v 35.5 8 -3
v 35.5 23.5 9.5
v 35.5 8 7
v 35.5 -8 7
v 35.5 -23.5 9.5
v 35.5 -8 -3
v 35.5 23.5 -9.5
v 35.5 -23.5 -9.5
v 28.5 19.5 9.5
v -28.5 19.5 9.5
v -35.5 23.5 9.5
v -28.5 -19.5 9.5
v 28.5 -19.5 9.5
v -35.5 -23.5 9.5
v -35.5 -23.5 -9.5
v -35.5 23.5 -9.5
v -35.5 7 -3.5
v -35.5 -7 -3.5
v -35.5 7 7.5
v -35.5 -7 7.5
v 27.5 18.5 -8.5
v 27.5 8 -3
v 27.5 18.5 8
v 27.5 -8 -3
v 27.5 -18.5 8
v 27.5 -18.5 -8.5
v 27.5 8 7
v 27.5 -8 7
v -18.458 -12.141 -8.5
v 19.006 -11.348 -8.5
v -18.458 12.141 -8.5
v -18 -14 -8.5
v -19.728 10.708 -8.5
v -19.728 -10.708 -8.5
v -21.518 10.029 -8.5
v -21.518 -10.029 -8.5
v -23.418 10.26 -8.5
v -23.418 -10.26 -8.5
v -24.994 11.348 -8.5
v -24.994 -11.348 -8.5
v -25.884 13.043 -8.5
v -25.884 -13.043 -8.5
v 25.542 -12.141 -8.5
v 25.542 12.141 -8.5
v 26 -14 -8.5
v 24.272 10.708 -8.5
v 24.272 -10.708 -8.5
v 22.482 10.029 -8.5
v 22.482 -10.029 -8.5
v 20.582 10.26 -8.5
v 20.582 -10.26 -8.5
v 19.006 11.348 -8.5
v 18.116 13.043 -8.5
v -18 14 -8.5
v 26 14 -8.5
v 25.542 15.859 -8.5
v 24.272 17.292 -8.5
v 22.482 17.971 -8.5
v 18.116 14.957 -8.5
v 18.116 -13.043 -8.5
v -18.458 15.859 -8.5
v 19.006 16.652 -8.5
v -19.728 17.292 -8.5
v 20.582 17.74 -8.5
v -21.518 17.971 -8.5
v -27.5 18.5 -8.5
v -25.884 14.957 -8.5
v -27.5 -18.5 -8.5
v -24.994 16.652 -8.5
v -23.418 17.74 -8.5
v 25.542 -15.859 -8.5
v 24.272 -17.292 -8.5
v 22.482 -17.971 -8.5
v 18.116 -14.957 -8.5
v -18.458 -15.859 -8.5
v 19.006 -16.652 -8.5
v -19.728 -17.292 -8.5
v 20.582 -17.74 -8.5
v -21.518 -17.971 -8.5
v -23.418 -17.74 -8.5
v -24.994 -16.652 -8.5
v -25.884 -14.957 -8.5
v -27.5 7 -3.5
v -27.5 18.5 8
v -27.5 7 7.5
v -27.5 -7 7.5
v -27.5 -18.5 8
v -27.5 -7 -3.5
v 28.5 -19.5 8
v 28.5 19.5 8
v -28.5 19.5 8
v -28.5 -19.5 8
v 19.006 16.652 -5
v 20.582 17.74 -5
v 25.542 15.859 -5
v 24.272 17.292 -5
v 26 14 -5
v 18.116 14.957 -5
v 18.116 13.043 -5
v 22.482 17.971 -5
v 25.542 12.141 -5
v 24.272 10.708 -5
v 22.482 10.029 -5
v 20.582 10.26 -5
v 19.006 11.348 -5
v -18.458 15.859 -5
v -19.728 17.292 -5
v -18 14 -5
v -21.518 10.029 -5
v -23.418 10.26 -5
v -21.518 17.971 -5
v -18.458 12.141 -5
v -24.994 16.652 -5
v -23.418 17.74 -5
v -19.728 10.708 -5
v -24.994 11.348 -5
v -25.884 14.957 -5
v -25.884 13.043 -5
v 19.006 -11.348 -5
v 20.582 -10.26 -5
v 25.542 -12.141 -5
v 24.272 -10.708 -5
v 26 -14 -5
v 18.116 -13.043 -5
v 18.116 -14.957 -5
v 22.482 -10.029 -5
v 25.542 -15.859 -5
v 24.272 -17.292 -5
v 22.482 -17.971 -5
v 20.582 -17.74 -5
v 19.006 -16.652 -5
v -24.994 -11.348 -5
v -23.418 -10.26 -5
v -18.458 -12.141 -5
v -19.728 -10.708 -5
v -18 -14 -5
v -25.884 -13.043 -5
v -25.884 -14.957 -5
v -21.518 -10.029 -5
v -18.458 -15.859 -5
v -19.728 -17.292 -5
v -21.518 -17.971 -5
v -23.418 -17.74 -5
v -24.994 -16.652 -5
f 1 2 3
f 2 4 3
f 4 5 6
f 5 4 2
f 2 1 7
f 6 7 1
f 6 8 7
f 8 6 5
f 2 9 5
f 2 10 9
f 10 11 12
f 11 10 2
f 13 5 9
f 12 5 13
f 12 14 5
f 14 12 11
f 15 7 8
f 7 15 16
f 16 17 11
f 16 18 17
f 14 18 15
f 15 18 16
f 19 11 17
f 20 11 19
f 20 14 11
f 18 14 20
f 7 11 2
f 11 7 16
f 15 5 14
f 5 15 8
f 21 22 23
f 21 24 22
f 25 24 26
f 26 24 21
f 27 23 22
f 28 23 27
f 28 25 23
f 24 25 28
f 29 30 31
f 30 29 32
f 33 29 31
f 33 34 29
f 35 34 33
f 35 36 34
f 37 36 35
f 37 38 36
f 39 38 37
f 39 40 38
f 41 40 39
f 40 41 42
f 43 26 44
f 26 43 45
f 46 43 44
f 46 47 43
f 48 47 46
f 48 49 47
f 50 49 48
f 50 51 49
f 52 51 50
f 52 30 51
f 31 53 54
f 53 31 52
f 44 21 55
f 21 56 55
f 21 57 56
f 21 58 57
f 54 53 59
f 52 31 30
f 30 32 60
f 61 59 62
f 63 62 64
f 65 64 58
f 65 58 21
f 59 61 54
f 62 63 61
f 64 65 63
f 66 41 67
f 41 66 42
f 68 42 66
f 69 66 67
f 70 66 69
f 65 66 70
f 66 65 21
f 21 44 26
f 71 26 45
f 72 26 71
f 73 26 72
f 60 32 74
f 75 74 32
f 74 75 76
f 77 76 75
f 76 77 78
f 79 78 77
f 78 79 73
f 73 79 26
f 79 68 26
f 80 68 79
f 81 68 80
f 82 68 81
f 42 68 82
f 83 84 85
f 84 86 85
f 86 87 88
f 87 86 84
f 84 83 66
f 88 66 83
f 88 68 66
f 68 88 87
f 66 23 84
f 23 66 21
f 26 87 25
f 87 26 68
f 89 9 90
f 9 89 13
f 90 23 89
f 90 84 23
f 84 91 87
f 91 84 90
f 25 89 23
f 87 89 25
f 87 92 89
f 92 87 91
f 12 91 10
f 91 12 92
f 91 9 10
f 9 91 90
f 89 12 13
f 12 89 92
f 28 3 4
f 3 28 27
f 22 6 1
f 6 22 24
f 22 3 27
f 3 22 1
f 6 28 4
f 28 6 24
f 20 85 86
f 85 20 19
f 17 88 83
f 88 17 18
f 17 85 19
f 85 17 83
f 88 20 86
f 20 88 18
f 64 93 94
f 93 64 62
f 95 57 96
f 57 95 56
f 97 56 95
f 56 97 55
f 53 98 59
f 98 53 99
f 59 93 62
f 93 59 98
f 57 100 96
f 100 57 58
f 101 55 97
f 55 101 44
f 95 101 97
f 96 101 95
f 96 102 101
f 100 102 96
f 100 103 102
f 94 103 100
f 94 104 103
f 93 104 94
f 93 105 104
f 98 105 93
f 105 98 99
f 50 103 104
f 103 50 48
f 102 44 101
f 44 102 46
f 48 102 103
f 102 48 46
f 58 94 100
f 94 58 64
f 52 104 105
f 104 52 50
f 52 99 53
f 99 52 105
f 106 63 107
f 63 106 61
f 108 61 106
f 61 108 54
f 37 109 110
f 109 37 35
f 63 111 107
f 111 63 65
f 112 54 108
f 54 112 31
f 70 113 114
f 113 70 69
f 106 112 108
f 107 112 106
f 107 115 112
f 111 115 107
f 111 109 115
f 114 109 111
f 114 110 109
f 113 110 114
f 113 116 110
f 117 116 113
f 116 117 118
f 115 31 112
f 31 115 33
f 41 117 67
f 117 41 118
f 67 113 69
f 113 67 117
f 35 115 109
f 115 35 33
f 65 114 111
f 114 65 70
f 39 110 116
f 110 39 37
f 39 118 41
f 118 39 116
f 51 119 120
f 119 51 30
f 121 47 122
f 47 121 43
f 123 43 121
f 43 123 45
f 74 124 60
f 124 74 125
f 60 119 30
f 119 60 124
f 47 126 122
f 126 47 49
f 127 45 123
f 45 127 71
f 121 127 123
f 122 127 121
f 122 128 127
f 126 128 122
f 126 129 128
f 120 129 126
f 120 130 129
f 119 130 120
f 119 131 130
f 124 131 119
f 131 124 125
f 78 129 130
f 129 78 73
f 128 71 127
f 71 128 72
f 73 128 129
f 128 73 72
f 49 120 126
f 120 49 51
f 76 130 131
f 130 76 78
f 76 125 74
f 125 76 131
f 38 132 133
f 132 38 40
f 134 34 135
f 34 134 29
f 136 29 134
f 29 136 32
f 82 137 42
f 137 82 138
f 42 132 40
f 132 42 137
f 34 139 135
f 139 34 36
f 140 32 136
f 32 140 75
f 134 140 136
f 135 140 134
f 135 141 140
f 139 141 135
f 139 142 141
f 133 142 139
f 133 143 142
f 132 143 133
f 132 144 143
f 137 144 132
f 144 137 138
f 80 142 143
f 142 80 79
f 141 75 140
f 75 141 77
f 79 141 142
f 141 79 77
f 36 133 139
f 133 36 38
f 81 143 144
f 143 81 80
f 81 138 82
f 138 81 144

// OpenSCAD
// Dimensions for parent
totalWidth = 71;
totalLength = 47;
totalHeight = 19;

// Dimensions for inner cube
innerWidth = 55;
innerLength = 37;
innerHeight = 19;

// Dimensions for ledge
ledgeWidth = 57;
ledgeLength = 39;
ledgeHeight = 2;

// Dimensions for cycliner
cylinderHeight = 4;
cylinderDiameter = 4;

// Dimensions for Arduino USB hole
arduinoHoleWidth = 10;
arduinoHoleLength = 16;
arduinoHoleHeight = 10;

// Dimensions for Computer UBS hole
computerHoleWidth = 10;
computerHoleLength = 14;
computerHoleHeight = 11;

difference() {
    intersection() {
        difference() {
            cube([totalWidth, totalLength, totalHeight], center = true);
            translate([0, 0, 1])
                cube([innerWidth, innerLength, innerHeight], center = true);
            translate([0, 0, 9])
                cube([ledgeWidth, ledgeLength, ledgeHeight], center = true);
            translate([32, 0, 2])
                cube([arduinoHoleWidth, arduinoHoleLength, arduinoHoleHeight], center = true);
            translate([-32, 0, 2])
                cube([computerHoleWidth, computerHoleLength, computerHoleHeight], center = true);
        }  
    }
}
translate([22, 14, -7])
                cylinder(cylinderHeight, cylinderDiameter, cylinderDiameter, center = true);
translate([-22, 14, -7])
                cylinder(cylinderHeight, cylinderDiameter, cylinderDiameter, center = true);
translate([22, -14, -7])
                cylinder(cylinderHeight, cylinderDiameter, cylinderDiameter, center = true);
translate([-22, -14, -7])
                cylinder(cylinderHeight, cylinderDiameter, cylinderDiameter, center = true);
